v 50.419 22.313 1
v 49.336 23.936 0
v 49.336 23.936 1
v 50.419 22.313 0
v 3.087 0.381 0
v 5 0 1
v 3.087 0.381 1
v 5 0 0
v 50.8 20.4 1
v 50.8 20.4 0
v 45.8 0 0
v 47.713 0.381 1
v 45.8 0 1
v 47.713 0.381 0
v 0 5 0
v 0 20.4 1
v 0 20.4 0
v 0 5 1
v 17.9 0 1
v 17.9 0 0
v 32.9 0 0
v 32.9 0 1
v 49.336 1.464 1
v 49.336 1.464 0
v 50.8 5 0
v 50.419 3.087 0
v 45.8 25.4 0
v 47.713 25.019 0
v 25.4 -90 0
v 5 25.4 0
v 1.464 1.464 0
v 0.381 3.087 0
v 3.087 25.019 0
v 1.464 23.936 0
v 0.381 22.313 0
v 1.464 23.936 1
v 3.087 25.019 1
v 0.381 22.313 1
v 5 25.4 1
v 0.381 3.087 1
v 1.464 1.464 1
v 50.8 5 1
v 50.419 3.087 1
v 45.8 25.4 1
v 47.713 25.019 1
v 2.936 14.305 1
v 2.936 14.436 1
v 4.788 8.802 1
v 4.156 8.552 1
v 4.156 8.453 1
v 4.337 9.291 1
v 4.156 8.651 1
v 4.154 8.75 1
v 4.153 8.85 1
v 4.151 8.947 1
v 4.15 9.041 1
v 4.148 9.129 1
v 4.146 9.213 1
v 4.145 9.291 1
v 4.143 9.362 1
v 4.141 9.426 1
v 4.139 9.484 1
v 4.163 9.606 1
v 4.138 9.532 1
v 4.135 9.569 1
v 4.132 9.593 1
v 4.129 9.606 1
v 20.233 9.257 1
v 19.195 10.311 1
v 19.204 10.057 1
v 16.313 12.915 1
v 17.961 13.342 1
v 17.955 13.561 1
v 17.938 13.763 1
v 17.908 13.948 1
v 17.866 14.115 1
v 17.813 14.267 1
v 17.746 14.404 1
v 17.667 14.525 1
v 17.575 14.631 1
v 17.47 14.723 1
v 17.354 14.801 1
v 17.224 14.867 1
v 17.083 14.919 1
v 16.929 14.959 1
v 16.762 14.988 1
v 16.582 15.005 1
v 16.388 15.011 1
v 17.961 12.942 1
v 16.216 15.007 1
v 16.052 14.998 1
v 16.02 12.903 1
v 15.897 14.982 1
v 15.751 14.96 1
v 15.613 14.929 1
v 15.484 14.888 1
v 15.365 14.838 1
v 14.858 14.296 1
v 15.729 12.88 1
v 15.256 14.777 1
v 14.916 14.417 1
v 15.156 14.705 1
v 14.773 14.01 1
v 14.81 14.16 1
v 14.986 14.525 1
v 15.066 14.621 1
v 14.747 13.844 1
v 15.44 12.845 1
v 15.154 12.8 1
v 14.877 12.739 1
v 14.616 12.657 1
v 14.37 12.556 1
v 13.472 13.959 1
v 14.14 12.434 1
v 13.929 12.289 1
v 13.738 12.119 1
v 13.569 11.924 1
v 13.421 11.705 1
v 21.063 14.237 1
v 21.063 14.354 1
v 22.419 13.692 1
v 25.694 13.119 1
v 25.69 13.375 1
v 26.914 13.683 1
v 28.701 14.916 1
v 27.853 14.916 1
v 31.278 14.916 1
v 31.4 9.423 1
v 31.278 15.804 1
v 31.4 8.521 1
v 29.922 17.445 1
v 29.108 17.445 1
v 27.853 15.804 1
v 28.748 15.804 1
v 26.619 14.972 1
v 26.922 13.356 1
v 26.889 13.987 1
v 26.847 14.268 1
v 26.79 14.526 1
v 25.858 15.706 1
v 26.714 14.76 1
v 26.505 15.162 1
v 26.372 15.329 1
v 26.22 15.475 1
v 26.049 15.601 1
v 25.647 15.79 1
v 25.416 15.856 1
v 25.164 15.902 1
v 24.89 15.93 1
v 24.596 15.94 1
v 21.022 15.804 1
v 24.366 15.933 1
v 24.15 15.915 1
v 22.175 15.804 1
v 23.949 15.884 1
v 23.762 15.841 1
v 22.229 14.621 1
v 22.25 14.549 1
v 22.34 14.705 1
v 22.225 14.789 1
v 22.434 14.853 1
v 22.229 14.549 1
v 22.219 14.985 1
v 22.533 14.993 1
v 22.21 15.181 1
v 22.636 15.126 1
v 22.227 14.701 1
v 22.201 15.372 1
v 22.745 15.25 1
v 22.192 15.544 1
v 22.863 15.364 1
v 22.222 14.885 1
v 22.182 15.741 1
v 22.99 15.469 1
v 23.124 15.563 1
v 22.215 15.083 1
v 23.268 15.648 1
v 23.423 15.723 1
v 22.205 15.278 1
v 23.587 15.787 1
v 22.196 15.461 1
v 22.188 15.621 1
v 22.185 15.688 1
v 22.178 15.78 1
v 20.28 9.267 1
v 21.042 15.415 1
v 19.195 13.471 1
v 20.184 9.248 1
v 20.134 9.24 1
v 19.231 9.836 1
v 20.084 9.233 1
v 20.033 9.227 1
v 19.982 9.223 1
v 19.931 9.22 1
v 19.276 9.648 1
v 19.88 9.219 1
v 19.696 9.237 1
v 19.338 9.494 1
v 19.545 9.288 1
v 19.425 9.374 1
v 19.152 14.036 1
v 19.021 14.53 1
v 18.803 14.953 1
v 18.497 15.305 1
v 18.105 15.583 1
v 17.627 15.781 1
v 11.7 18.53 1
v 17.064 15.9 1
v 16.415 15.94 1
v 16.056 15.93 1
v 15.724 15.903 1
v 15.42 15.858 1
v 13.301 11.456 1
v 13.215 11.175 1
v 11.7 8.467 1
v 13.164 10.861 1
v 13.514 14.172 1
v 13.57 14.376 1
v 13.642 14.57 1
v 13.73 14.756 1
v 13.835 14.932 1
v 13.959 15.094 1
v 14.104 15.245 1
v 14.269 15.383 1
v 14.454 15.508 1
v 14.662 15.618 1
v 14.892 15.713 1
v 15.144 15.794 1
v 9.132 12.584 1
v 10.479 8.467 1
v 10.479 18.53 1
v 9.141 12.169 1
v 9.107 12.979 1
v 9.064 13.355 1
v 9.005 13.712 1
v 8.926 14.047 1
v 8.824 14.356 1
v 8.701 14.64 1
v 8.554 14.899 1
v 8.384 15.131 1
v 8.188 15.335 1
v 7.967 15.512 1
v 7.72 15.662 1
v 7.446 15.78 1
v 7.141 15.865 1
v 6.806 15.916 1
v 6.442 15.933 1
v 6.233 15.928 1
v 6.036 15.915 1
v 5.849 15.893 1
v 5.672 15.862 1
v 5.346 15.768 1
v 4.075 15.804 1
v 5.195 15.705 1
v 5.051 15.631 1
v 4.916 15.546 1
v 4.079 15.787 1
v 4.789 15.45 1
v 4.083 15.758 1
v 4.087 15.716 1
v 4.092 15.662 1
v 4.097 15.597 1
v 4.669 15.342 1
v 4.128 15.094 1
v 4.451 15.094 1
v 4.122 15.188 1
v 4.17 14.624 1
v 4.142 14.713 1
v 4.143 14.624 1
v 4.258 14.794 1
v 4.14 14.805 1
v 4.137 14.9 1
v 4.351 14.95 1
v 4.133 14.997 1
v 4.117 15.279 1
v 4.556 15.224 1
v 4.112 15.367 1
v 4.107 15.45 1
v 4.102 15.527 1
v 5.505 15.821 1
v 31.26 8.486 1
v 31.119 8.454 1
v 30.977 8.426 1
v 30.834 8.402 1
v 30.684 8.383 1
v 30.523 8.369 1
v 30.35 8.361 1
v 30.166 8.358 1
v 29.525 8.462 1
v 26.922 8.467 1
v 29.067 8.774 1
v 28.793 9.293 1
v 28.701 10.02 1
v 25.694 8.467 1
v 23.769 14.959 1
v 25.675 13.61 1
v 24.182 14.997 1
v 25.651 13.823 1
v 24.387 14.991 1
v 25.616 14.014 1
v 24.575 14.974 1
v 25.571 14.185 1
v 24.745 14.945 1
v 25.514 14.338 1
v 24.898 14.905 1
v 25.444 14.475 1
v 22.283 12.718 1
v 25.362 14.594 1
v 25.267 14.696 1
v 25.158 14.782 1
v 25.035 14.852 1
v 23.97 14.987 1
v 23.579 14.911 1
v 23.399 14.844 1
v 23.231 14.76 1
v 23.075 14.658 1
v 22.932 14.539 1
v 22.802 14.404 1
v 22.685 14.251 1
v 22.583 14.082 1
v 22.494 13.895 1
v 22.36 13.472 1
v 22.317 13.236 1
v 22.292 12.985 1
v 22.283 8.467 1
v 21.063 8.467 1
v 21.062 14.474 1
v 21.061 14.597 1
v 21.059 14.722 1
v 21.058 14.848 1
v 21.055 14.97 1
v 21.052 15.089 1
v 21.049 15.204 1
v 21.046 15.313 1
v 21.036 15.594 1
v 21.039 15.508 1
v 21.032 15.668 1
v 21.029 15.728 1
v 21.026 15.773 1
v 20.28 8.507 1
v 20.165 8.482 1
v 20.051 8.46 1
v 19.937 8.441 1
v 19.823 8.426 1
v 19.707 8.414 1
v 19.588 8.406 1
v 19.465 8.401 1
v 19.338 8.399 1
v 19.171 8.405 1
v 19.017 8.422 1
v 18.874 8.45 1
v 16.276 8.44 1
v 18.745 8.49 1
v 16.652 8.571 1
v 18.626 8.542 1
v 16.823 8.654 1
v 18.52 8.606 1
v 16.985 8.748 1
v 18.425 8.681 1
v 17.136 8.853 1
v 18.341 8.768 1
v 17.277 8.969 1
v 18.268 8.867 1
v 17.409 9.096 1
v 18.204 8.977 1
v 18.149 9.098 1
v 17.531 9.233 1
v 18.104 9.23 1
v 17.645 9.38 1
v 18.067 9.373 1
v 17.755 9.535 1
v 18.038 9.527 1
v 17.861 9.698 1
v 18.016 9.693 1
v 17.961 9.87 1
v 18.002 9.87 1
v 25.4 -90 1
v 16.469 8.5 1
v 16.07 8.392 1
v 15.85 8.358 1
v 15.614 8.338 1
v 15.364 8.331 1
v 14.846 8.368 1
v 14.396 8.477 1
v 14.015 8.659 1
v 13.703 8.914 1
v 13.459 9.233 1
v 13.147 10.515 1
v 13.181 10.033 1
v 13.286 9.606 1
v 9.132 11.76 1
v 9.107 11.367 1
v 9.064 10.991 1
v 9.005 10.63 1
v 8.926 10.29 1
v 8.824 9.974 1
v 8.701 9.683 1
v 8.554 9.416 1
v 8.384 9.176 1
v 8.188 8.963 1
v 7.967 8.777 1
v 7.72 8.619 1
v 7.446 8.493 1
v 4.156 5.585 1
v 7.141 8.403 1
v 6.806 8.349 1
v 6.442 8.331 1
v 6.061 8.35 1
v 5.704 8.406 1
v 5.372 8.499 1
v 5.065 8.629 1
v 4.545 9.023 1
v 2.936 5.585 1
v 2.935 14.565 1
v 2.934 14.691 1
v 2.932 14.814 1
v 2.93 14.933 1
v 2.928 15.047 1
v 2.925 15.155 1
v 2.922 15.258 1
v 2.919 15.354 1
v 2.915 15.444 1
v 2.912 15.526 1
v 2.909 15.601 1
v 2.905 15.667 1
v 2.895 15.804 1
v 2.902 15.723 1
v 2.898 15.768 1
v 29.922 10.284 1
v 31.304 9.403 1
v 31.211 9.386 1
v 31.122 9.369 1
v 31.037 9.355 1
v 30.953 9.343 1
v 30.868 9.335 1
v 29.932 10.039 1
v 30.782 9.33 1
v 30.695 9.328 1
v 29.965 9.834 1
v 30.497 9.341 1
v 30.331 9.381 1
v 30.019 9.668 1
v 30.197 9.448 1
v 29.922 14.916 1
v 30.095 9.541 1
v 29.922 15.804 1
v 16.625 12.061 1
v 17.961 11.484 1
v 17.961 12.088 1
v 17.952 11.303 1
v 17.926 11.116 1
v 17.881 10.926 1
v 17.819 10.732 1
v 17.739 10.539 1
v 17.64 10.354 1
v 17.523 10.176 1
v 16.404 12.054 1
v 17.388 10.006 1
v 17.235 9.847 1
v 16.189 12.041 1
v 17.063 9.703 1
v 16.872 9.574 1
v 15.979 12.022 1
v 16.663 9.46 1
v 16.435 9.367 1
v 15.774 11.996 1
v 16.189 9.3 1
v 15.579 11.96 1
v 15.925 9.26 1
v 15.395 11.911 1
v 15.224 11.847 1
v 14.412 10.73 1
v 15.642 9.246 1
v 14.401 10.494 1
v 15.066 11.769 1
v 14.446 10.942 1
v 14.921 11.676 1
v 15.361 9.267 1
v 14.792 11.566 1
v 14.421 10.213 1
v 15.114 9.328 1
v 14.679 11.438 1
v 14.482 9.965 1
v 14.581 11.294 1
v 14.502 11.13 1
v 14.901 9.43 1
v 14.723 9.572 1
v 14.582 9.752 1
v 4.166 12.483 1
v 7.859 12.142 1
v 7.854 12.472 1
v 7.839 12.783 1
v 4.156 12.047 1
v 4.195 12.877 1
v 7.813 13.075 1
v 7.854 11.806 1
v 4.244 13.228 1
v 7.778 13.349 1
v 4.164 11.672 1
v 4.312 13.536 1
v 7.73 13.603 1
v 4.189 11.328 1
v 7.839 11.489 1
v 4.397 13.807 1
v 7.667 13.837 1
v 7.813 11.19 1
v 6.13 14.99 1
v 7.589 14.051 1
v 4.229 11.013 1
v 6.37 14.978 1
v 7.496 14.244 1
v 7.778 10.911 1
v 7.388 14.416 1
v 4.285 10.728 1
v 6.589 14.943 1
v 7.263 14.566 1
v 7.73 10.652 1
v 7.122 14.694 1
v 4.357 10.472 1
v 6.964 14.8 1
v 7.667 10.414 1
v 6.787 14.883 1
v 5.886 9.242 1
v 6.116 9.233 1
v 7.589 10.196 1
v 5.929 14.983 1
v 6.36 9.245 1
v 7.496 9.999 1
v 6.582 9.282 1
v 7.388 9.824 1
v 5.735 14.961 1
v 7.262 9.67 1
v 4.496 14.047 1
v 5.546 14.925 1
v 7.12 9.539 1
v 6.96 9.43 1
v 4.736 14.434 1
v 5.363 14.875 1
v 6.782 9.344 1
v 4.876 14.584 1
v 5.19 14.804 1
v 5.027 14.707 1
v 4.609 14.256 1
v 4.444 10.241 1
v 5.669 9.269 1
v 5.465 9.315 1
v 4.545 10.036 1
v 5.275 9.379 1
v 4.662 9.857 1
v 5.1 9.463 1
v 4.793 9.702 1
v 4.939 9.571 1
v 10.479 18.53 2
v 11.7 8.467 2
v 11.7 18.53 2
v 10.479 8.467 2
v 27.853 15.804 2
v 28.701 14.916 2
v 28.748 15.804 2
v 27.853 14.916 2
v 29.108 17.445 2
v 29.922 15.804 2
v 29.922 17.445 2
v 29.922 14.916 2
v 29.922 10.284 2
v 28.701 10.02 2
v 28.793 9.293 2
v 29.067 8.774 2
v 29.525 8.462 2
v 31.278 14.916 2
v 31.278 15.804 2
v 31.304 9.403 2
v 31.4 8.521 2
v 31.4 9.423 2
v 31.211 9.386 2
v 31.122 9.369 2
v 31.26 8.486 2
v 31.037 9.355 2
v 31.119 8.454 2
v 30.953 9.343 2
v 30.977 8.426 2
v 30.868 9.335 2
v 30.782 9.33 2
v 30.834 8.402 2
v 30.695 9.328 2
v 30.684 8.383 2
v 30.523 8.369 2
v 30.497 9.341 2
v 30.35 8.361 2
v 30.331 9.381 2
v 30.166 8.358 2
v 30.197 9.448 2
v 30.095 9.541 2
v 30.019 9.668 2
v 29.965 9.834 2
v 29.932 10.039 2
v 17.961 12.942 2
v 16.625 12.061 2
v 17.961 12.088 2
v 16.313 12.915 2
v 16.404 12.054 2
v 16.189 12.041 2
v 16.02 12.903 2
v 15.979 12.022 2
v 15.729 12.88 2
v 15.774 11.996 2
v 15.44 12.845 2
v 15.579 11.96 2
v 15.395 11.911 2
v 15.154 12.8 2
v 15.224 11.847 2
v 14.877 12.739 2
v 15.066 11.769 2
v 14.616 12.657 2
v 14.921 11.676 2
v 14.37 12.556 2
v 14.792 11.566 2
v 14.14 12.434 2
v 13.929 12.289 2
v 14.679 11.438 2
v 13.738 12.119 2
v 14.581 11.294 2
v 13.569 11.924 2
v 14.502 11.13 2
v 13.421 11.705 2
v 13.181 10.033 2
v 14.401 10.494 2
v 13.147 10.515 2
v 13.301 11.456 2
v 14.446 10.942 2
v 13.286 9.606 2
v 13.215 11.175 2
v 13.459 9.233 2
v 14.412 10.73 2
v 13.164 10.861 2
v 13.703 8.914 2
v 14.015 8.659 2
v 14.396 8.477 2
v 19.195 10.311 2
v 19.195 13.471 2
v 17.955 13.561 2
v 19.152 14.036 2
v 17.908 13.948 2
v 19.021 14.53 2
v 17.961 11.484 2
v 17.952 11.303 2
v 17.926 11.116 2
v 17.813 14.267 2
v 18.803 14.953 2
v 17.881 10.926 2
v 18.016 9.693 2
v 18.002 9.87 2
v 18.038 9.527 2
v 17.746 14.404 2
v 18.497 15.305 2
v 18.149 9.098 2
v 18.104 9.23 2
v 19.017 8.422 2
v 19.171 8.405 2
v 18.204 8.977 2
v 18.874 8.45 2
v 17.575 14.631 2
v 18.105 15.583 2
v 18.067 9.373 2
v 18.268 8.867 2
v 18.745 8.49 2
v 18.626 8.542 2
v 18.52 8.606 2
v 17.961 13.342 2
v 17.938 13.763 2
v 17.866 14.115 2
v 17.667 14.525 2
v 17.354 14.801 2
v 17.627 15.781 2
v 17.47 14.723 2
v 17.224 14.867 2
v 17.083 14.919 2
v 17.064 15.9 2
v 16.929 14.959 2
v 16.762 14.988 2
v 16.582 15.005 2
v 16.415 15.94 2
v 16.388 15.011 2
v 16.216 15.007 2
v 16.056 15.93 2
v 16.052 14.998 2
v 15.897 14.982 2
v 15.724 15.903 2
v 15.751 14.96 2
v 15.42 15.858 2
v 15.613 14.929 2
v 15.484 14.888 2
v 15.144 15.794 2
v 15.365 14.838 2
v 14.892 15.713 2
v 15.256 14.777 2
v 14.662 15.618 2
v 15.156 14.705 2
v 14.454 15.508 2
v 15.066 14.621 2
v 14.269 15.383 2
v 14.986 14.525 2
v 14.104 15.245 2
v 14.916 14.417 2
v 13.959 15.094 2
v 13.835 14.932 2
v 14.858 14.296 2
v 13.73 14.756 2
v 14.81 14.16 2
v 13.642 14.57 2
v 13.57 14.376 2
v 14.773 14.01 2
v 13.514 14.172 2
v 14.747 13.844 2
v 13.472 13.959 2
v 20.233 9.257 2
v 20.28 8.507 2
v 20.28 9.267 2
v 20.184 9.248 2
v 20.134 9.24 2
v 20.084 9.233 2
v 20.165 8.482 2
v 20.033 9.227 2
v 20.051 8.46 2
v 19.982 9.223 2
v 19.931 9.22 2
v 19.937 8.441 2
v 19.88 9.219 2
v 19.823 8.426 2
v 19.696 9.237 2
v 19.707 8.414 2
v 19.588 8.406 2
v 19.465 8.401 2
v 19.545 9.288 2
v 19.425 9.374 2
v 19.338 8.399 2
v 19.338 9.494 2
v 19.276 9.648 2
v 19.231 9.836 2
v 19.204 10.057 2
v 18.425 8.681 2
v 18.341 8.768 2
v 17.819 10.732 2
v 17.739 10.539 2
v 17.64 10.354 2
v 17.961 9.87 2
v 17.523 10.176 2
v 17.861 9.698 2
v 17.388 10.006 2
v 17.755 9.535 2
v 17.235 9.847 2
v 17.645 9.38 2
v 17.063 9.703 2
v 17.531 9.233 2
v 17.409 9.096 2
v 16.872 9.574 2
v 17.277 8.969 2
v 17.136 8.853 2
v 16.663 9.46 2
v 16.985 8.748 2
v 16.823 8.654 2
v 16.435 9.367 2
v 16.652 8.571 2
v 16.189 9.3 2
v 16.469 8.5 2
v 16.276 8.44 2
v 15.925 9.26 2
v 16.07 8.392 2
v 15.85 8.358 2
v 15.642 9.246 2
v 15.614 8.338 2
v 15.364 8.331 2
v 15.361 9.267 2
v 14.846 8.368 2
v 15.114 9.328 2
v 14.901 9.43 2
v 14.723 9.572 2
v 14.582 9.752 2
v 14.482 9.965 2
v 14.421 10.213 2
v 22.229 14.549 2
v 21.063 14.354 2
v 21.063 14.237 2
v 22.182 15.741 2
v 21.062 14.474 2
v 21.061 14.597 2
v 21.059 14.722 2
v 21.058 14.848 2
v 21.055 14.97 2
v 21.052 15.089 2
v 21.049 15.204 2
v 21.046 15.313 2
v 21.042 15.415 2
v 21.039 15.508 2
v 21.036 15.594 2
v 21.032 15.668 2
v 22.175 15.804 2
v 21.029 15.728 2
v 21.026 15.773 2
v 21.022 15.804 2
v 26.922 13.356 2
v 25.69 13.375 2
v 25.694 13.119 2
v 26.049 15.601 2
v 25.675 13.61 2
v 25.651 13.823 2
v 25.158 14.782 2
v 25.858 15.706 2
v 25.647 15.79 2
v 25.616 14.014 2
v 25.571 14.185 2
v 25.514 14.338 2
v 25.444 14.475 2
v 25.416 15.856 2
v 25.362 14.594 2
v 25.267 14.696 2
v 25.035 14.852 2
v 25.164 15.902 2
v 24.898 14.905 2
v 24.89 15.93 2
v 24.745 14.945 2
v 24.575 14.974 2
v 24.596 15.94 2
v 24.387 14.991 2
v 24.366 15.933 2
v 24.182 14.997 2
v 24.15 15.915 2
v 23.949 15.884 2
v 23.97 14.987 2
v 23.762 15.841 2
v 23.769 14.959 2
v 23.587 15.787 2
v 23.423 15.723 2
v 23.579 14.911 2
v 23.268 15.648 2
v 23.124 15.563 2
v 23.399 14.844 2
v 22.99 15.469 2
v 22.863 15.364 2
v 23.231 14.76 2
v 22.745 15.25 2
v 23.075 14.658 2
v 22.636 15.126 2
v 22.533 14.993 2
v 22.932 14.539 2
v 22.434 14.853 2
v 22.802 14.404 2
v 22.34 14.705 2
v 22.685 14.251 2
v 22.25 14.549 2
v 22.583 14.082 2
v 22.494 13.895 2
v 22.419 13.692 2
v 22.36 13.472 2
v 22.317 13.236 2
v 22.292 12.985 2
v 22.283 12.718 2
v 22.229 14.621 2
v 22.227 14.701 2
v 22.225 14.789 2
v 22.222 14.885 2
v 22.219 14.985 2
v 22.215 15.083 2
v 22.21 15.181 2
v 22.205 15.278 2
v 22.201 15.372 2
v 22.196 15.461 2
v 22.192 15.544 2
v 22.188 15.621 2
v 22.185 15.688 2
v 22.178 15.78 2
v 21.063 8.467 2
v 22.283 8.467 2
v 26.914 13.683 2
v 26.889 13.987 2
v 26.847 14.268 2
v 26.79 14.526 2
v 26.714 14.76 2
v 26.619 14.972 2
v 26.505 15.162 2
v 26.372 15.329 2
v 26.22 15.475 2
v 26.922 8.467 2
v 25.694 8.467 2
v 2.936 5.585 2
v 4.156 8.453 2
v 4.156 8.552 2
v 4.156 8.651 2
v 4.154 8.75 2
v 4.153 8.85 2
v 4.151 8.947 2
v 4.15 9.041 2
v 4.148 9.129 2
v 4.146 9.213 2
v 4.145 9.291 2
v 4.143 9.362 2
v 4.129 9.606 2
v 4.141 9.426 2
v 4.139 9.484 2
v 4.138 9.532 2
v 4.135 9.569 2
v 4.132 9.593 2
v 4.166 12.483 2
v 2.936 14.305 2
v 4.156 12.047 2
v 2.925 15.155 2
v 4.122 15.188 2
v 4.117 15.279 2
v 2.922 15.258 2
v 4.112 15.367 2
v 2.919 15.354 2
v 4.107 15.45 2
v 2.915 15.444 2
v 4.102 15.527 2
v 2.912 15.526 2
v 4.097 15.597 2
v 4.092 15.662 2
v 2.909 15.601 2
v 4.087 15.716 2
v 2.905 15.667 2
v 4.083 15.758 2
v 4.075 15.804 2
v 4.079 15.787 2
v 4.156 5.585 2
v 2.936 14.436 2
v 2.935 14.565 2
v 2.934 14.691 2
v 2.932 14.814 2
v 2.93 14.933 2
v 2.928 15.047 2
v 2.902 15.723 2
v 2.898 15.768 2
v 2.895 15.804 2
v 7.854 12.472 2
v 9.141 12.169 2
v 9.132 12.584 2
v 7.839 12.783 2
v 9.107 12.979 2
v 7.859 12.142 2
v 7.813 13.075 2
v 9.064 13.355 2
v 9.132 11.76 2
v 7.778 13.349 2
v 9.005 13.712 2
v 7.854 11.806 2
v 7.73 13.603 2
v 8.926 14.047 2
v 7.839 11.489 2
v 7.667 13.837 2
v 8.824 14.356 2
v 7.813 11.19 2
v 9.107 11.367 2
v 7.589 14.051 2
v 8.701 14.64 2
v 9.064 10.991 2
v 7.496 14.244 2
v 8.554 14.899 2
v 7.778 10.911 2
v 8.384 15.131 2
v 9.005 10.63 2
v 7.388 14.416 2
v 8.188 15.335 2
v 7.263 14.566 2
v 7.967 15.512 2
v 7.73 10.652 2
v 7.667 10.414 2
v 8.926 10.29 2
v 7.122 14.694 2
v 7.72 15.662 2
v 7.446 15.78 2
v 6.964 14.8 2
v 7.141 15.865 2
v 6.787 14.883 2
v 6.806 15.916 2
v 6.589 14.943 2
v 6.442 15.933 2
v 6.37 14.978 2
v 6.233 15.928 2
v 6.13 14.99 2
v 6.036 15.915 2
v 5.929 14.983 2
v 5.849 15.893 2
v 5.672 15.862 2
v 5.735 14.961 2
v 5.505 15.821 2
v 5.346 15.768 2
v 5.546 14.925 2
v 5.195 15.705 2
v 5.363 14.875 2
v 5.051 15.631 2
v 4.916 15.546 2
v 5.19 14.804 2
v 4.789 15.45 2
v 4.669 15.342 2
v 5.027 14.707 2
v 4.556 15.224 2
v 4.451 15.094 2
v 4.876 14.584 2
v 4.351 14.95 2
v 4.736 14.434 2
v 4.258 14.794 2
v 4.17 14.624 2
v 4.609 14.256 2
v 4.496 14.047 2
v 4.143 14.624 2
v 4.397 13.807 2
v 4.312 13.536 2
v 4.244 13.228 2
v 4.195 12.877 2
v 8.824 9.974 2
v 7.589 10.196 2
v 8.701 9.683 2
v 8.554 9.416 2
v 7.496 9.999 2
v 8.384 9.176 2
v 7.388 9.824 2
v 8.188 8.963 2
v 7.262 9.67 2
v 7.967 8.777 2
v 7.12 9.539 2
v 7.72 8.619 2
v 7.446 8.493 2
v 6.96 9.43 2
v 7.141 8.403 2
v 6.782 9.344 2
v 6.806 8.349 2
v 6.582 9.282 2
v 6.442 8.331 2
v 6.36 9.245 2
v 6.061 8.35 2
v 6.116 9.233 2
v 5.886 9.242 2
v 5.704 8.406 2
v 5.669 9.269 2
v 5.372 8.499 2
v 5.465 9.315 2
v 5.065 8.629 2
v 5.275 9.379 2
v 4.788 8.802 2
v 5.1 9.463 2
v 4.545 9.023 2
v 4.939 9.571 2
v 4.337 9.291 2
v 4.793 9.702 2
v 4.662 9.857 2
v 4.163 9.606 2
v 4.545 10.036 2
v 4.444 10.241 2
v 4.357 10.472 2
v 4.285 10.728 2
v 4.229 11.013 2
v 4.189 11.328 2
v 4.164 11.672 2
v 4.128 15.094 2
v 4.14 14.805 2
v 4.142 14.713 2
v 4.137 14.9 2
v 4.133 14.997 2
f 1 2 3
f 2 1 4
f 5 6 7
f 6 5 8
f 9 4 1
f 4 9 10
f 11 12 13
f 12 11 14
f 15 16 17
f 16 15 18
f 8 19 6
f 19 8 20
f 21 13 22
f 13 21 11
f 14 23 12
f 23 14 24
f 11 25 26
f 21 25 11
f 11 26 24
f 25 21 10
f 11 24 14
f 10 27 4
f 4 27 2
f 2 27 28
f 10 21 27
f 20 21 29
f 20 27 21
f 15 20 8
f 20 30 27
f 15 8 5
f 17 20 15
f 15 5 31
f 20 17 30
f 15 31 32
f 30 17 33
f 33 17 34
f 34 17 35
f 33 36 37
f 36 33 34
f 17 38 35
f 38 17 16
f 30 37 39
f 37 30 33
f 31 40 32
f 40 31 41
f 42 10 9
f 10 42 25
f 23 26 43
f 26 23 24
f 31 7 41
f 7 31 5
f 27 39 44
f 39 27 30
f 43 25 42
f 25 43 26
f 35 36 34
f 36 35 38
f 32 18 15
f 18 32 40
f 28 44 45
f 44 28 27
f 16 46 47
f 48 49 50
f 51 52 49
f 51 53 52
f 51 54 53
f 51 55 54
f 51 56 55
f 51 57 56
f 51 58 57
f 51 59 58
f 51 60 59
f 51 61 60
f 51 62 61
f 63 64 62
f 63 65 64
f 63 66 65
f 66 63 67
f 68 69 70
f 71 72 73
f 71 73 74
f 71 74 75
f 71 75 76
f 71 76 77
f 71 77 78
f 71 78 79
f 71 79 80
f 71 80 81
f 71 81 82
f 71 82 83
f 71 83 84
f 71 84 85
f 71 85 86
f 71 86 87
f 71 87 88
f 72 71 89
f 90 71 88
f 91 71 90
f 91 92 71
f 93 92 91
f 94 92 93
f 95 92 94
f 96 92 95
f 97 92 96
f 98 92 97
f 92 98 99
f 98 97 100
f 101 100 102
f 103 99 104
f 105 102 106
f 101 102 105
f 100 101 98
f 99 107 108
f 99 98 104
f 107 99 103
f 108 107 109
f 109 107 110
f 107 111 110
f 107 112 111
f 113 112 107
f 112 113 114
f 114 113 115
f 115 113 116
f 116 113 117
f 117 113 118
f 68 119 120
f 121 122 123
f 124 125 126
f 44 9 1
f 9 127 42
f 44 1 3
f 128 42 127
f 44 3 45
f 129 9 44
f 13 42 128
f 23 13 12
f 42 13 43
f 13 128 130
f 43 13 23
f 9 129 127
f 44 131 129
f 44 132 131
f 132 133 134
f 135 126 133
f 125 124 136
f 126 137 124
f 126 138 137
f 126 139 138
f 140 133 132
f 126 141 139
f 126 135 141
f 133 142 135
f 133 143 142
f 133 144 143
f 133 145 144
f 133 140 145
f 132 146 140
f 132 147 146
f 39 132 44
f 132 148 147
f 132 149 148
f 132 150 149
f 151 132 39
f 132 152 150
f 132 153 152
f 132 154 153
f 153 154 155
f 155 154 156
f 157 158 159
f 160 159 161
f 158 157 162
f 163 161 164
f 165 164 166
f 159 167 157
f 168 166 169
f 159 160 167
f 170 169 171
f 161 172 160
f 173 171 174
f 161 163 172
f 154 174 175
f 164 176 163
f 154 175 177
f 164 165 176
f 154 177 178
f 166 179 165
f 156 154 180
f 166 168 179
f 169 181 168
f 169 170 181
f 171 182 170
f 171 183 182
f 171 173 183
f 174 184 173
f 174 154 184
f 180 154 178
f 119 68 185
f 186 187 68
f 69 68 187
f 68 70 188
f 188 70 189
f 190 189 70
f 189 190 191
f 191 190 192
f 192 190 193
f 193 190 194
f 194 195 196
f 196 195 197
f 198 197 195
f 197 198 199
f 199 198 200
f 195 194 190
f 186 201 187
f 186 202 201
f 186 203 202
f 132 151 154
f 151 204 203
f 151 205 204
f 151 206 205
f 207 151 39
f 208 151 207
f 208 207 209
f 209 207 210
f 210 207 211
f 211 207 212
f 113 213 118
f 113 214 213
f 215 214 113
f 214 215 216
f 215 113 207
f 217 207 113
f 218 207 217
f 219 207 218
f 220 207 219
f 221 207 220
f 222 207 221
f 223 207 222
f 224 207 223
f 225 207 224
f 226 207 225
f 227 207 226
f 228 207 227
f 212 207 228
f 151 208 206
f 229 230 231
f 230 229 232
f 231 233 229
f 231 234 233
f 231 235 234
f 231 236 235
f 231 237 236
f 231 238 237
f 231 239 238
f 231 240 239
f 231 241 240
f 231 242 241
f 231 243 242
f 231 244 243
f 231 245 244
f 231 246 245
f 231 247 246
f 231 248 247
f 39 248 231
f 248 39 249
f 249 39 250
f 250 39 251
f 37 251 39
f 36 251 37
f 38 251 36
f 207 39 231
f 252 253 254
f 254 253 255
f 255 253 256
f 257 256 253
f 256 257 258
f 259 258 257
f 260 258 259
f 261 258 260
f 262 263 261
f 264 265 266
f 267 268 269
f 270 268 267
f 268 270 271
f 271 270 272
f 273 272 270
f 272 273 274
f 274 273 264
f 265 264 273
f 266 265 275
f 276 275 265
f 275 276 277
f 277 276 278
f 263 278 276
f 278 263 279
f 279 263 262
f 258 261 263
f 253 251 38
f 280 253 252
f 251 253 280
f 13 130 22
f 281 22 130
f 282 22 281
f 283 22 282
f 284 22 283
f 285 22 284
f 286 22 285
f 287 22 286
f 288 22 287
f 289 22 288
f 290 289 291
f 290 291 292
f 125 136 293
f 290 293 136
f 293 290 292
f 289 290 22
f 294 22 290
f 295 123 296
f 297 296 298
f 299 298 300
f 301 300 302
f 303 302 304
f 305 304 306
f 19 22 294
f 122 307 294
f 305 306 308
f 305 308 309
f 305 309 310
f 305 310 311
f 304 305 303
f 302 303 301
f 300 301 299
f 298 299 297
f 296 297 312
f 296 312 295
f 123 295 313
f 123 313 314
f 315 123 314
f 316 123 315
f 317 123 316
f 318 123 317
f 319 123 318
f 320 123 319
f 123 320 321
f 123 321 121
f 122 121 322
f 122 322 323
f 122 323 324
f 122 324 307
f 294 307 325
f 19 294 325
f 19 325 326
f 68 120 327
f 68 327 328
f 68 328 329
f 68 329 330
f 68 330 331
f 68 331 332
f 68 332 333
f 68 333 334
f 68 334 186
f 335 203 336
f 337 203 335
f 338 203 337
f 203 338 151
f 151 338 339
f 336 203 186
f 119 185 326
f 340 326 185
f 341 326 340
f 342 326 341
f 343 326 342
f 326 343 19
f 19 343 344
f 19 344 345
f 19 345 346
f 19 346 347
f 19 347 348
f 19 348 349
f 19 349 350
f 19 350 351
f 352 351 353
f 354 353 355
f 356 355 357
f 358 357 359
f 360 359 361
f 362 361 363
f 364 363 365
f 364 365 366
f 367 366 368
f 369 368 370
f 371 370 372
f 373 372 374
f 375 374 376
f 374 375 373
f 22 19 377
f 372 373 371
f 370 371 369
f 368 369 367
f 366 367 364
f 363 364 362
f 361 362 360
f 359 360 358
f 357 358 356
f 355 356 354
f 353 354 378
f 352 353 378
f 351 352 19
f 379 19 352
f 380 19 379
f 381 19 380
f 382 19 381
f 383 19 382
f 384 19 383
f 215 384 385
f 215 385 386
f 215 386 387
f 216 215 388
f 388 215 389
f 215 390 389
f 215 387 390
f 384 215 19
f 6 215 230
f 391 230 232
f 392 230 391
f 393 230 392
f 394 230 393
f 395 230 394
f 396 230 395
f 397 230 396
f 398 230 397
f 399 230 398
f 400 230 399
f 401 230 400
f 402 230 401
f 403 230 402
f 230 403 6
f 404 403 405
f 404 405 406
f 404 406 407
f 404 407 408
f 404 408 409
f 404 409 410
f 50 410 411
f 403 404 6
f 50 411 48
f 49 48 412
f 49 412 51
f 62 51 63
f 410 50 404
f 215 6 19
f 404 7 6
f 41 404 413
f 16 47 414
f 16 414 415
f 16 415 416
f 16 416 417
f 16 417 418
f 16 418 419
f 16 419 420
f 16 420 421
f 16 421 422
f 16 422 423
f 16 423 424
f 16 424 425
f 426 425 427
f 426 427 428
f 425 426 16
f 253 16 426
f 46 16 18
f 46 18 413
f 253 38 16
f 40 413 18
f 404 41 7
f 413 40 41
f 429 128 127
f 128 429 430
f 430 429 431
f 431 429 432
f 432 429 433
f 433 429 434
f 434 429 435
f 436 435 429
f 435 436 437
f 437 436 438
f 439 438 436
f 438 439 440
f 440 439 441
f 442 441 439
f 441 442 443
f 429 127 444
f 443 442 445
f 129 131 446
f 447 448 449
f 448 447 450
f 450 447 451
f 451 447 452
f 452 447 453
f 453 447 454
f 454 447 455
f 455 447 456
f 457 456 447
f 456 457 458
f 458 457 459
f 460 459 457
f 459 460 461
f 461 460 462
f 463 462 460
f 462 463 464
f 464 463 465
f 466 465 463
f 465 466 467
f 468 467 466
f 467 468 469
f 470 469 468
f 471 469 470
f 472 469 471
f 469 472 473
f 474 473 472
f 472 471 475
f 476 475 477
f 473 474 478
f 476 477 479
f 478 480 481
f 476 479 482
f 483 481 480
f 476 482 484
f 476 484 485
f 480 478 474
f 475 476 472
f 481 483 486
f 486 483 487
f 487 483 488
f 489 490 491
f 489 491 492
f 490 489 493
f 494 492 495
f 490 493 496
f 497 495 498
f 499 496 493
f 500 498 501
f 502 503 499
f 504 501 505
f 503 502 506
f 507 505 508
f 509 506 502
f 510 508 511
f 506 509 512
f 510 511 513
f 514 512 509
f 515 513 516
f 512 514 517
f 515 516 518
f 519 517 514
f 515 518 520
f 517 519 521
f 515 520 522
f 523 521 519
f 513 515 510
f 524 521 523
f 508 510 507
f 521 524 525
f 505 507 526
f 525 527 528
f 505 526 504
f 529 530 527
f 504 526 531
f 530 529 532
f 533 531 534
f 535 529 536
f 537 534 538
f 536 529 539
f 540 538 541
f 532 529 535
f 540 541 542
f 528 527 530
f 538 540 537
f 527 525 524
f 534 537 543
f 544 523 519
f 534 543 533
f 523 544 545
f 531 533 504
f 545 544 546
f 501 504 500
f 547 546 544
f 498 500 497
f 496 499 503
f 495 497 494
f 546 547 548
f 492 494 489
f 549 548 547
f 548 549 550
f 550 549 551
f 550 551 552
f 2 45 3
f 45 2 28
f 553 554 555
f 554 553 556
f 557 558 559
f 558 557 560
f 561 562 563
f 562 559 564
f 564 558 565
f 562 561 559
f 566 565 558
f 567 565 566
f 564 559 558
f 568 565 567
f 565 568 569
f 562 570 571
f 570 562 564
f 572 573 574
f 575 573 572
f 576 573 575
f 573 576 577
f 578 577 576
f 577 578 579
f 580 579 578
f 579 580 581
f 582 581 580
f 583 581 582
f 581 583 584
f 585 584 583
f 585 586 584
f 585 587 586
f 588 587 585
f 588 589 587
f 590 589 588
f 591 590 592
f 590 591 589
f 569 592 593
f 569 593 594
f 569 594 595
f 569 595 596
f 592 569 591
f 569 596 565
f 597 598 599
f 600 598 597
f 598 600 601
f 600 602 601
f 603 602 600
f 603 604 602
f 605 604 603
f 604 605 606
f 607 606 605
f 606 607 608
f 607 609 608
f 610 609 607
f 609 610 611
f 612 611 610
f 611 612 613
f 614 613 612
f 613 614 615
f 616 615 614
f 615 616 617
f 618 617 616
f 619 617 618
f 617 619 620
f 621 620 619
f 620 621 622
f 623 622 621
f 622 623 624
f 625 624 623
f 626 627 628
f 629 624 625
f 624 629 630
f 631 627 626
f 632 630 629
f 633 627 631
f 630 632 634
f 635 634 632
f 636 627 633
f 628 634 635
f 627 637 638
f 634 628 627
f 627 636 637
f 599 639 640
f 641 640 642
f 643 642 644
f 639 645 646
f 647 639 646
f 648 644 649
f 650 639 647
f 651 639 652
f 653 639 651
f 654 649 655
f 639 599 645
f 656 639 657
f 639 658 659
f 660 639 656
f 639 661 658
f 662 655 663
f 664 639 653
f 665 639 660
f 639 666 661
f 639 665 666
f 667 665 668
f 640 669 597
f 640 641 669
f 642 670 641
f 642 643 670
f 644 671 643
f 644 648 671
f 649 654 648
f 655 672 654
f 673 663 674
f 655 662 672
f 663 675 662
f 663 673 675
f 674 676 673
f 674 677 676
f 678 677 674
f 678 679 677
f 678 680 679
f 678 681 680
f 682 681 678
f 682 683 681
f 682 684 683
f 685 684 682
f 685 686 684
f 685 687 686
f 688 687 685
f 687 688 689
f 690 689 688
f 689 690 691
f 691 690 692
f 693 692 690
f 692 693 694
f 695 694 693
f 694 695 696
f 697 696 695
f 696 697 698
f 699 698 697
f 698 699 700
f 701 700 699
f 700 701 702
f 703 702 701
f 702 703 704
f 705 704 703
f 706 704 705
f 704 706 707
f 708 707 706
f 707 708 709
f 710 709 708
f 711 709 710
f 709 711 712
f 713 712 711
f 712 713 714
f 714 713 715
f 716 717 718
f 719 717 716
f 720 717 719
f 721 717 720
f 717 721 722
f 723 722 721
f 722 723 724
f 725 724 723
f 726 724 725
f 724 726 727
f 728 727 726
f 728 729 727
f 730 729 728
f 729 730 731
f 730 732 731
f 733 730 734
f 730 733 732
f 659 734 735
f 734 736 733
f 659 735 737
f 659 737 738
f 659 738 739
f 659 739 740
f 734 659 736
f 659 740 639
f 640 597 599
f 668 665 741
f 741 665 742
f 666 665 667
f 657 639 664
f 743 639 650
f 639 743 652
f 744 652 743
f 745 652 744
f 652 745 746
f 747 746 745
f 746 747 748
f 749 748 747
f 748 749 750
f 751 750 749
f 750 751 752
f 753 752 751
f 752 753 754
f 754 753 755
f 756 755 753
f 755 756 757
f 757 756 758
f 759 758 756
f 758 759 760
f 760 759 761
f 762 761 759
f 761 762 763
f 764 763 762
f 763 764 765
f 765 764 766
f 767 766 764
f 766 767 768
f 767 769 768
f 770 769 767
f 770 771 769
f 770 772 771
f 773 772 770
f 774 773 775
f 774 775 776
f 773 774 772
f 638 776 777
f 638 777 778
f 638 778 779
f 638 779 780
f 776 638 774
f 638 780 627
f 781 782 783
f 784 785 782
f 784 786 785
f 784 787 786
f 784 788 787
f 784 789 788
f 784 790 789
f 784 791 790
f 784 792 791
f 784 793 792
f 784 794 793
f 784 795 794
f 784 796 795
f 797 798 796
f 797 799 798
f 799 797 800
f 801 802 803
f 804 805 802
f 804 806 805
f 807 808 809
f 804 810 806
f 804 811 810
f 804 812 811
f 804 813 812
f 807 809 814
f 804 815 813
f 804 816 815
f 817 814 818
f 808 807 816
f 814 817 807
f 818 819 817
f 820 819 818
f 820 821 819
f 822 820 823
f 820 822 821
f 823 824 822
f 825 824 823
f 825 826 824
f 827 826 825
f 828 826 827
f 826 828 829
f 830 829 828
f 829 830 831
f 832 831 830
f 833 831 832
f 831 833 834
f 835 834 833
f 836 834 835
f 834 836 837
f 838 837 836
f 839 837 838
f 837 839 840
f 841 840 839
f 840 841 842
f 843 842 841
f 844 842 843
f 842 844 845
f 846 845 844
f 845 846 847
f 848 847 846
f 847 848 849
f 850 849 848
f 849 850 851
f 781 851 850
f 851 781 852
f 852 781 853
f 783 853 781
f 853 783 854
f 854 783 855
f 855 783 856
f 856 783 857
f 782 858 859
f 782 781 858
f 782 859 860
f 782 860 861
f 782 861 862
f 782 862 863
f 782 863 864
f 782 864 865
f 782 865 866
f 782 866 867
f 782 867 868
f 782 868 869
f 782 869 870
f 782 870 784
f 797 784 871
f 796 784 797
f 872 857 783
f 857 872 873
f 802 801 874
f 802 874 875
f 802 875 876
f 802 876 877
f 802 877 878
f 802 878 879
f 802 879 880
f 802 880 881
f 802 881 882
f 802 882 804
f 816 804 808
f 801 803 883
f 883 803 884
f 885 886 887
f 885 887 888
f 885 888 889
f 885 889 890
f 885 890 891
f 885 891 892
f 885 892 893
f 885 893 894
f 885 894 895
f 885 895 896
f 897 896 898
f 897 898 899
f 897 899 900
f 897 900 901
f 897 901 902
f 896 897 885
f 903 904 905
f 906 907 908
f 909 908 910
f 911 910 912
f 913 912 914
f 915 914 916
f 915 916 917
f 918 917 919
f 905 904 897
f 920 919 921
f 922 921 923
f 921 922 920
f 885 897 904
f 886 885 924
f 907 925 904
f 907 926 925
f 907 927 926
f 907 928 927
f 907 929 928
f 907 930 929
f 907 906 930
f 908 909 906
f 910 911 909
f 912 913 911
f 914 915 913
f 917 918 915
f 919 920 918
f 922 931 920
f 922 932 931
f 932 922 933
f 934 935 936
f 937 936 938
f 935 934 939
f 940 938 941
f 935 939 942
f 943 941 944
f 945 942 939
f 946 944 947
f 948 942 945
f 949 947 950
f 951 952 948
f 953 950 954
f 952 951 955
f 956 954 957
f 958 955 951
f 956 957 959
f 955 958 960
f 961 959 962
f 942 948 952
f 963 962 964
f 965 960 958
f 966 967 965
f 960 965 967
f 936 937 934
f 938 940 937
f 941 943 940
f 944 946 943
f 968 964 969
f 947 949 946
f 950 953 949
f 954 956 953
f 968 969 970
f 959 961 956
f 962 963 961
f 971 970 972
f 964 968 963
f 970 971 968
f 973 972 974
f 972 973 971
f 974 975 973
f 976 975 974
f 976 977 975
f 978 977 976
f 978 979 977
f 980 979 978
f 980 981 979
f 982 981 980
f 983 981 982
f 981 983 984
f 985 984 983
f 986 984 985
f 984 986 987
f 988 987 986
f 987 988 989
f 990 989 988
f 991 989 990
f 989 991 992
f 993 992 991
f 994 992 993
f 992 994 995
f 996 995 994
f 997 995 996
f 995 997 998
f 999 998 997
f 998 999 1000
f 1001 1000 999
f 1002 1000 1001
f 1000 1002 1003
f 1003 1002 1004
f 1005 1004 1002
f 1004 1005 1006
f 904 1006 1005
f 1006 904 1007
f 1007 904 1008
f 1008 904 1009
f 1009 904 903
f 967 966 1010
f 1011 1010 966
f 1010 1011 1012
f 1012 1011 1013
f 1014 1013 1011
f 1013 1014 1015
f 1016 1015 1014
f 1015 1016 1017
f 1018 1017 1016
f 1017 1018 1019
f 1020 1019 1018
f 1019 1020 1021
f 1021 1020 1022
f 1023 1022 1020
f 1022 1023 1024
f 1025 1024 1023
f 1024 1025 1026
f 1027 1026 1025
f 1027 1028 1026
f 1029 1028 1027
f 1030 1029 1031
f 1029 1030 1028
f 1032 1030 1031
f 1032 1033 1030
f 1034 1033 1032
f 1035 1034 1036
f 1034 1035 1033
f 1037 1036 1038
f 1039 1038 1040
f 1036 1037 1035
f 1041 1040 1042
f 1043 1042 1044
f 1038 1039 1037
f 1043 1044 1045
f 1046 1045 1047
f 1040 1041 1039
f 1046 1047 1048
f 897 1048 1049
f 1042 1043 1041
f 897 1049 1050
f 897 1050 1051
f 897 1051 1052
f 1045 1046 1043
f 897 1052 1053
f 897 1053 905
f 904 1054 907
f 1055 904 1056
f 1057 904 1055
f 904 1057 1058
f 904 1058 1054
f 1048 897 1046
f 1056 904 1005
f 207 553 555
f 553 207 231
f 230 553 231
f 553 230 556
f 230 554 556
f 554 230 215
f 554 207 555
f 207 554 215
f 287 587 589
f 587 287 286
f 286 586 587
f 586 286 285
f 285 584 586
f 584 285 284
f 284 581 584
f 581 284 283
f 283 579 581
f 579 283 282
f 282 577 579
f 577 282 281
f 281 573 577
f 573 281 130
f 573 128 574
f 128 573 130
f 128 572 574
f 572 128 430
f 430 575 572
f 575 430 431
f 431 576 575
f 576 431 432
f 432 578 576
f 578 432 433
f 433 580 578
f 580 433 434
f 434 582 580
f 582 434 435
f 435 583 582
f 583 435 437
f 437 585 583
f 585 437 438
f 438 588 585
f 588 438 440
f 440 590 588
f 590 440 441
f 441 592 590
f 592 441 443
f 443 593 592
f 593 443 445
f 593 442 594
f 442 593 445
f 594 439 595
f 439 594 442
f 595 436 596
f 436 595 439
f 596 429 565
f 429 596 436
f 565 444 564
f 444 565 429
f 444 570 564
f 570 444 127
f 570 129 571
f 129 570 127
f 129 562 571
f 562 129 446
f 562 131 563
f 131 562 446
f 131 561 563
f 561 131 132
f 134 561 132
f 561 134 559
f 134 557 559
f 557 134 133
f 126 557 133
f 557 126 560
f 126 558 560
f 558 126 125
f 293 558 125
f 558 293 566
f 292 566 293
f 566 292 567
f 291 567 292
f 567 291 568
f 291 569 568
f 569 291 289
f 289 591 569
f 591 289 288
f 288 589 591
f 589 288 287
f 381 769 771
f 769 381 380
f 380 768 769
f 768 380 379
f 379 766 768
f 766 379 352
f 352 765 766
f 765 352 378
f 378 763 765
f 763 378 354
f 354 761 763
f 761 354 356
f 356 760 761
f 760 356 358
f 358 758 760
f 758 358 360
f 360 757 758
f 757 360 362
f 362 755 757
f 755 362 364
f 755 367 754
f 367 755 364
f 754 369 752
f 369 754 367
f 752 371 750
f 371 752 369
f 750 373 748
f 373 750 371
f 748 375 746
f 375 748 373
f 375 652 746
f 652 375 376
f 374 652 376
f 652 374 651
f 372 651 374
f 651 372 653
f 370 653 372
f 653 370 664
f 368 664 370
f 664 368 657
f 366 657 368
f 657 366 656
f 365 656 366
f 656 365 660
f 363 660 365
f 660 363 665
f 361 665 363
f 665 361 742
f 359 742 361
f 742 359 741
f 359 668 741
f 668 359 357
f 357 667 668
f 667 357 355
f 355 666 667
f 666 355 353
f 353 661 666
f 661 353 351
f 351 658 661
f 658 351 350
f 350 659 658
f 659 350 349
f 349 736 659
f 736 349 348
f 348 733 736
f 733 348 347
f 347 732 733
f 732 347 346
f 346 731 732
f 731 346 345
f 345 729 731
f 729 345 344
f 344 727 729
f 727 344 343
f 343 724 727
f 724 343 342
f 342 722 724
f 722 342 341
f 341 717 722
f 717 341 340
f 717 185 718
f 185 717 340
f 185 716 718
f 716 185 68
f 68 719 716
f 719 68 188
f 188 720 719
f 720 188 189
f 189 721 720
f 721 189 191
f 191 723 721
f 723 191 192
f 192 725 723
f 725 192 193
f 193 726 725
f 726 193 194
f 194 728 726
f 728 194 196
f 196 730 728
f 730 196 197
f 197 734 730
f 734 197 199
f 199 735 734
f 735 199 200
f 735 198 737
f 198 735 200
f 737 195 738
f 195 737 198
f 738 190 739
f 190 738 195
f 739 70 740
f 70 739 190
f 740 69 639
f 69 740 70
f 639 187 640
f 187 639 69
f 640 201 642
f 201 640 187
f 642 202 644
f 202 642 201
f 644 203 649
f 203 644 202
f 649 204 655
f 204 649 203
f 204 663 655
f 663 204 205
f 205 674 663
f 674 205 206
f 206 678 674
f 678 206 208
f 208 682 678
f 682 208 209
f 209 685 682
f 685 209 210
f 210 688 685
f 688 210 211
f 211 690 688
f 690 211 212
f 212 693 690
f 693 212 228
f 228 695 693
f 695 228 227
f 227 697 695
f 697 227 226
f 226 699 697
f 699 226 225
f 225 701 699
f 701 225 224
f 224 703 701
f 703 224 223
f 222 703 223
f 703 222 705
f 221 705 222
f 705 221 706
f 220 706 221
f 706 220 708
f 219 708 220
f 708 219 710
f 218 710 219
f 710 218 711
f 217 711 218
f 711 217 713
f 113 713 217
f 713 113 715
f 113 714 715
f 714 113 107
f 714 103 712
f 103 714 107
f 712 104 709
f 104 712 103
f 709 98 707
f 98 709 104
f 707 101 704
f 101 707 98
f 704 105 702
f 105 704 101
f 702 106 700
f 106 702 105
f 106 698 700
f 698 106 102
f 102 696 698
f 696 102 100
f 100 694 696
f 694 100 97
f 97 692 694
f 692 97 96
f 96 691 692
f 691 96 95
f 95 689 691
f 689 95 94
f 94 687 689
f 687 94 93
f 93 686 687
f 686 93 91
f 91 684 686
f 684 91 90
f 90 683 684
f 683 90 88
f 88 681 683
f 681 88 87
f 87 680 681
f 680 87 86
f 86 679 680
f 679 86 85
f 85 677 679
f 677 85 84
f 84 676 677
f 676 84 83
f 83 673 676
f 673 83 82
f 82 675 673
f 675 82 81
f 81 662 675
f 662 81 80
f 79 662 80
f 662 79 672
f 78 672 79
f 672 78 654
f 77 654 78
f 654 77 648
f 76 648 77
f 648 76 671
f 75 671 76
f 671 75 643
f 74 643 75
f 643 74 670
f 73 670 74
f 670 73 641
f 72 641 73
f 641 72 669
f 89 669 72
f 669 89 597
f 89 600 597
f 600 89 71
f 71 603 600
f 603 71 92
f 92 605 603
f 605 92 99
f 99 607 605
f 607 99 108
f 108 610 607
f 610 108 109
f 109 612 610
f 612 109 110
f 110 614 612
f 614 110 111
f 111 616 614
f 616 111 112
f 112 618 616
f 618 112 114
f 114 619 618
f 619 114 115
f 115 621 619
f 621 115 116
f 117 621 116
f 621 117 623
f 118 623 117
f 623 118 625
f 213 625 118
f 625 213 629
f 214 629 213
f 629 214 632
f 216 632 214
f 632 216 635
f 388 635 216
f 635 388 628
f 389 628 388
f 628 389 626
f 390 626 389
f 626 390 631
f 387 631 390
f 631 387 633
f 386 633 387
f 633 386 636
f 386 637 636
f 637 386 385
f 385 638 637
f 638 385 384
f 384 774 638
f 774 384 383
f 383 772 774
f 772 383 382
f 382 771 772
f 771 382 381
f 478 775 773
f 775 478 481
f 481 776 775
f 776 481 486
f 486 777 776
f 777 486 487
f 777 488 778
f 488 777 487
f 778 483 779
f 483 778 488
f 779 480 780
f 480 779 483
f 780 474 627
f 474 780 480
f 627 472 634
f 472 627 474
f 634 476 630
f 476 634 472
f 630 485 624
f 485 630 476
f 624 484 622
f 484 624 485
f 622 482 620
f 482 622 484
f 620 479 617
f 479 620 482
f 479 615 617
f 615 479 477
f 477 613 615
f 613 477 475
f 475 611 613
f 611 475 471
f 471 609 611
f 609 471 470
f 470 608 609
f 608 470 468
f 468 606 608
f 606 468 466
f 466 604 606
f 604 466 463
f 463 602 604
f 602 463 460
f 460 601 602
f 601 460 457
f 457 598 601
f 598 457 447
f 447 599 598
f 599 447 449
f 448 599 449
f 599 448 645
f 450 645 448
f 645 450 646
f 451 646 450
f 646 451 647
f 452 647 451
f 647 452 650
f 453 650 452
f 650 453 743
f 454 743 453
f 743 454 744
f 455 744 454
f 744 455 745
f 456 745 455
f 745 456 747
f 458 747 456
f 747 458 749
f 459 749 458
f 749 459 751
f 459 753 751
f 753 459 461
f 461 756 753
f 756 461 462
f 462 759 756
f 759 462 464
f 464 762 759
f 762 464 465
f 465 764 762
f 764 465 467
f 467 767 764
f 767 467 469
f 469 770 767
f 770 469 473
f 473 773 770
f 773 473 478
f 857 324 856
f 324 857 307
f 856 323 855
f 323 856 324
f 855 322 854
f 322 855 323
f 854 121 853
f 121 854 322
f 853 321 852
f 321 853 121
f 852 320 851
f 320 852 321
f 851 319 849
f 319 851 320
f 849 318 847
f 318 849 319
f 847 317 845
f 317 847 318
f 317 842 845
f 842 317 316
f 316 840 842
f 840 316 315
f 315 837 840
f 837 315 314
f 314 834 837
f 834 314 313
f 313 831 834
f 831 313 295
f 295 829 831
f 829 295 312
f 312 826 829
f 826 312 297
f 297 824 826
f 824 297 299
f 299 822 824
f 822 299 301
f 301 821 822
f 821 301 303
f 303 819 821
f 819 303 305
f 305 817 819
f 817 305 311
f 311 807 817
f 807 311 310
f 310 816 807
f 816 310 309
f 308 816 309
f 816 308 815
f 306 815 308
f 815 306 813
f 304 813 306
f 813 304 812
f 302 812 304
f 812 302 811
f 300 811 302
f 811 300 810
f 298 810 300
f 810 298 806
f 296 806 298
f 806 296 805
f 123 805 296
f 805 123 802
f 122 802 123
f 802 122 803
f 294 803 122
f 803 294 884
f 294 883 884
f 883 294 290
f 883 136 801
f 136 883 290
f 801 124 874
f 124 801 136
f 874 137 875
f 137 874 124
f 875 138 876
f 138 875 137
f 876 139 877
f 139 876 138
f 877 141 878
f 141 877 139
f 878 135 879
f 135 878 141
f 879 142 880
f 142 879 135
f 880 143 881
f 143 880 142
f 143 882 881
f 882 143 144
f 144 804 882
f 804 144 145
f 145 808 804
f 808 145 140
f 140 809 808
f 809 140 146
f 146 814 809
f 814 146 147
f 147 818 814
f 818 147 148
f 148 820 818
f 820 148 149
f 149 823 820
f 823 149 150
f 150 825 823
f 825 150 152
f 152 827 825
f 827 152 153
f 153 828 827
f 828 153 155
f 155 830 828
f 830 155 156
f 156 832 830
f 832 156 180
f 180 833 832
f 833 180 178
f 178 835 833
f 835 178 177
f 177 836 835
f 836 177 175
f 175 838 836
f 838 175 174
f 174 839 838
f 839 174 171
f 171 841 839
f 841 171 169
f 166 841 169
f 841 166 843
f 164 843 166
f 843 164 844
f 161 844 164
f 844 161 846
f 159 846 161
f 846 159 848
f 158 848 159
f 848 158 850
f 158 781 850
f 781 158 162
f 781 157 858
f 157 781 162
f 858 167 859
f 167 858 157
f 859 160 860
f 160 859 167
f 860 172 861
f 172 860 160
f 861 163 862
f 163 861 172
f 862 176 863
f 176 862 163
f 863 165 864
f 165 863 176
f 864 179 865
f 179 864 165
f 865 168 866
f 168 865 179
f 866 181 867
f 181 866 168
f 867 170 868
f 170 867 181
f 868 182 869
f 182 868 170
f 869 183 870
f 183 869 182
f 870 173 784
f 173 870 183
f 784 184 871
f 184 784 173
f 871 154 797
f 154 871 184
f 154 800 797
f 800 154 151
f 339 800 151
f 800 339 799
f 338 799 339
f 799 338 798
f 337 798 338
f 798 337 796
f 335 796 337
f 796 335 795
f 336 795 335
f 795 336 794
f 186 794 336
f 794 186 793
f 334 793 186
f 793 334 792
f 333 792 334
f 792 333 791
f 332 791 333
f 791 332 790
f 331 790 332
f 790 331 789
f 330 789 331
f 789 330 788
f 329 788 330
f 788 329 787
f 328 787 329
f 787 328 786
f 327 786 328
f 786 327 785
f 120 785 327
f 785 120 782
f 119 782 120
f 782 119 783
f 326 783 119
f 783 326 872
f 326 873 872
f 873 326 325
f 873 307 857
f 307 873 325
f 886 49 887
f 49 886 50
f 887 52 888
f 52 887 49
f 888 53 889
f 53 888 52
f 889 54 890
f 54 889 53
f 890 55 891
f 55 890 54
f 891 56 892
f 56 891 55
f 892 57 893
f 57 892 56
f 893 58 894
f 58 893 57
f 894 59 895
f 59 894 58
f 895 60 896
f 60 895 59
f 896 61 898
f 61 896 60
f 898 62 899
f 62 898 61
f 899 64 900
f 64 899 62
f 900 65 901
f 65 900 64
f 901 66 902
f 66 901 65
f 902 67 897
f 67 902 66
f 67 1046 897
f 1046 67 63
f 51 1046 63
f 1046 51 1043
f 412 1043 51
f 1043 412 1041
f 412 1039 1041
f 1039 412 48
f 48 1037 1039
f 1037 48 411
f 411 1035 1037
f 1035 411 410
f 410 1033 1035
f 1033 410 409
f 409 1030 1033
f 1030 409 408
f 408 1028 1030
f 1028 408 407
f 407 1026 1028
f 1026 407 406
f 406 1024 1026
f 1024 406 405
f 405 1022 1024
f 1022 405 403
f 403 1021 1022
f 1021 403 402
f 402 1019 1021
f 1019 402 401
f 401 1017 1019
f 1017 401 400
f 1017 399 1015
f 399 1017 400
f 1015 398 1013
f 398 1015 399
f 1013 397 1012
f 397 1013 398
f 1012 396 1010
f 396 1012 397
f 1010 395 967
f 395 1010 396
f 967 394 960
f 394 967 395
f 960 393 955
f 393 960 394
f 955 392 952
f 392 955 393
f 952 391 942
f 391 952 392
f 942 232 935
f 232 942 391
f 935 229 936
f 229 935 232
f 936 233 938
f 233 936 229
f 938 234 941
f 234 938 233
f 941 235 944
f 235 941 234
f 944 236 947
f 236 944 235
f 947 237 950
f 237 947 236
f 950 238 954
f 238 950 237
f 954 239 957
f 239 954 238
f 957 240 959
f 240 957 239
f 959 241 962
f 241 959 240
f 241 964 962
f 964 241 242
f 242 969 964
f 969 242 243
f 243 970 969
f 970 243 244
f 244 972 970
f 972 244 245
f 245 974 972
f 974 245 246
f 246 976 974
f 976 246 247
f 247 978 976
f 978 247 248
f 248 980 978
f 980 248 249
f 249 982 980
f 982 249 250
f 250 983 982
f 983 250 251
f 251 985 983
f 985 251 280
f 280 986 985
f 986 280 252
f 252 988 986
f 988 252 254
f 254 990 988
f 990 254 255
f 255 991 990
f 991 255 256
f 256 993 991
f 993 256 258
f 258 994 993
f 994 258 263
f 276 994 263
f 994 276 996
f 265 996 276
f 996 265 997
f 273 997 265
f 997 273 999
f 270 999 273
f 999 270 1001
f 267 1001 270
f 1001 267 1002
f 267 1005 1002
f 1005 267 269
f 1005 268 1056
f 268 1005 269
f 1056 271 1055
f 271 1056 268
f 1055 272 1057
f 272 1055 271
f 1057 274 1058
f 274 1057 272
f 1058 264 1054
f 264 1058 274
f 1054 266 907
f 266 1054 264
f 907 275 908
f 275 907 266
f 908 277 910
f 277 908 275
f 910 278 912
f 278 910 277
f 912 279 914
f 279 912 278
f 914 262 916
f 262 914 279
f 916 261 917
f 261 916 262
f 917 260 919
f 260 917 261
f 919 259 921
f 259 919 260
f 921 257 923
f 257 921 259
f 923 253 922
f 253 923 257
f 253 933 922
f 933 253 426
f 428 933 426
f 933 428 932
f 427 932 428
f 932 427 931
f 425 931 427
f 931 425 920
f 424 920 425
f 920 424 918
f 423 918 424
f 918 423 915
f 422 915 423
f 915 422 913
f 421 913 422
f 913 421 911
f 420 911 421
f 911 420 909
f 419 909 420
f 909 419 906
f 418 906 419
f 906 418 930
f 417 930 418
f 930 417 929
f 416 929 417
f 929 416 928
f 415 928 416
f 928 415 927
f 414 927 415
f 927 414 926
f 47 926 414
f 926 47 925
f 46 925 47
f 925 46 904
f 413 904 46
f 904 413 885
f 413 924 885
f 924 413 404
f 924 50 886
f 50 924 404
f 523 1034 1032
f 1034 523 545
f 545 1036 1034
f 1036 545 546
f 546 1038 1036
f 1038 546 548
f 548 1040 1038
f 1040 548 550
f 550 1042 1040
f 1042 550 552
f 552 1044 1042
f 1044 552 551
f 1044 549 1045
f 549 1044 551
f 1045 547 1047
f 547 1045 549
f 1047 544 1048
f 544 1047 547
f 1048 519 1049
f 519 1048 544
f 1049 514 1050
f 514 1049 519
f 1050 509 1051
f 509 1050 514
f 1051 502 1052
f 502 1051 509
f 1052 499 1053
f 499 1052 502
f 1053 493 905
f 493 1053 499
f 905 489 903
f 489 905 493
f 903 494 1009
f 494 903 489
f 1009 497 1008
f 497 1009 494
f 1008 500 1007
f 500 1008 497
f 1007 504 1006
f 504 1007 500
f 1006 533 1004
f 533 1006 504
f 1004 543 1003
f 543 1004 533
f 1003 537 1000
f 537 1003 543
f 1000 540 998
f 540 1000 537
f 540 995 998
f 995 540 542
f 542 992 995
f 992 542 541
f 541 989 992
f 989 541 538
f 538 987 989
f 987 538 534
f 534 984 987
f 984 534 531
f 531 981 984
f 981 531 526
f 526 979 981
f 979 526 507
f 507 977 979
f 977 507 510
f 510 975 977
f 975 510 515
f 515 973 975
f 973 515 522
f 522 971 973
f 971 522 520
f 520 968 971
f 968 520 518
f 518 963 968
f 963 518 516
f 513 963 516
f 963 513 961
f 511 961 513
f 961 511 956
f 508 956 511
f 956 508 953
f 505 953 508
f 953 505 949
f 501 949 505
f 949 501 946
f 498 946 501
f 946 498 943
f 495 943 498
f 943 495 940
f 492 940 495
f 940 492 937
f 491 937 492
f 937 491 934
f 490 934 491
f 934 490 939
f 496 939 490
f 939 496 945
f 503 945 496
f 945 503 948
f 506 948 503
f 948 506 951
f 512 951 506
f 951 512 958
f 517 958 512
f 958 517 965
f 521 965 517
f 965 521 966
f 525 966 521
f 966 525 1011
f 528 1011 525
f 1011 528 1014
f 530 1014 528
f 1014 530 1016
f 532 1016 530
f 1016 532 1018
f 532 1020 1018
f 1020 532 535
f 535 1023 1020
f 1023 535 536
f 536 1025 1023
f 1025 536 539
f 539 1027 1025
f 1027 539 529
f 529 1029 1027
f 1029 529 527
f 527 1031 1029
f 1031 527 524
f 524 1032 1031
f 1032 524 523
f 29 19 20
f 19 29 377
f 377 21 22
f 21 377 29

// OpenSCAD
// SPDX-FileCopyrightText: 2023 John Romkey
//
// SPDX-License-Identifier: MIT

// dimensions are in mm
width = 2*25.4;
height = 1*25.4;
thickness = 1;

spike_width = 15;
spike_height = 90;

// adjust scale to make the plant name fit on the sign
scale = 1;
name = "plant";

module rounded_square( width, height, radius_corner ) {
    translate([radius_corner, radius_corner, 0 ] )
	minkowski() {
            square([width - 2 * radius_corner, height - 2 * radius_corner]);
            circle( radius_corner );
        }
}

module sign(name, scale=1) {
  linear_extrude(1)
    rounded_square(width, height, 5);

  translate([2, height/3, thickness])
    linear_extrude(1)
      scale([scale, scale, scale])
        text(name);

  translate([width/2-spike_width/2, 0, 0])
    linear_extrude(thickness)
      polygon(points=[[0, 0], [spike_width, 0], [spike_width/2, -spike_height]]);
}

sign(name, scale);
